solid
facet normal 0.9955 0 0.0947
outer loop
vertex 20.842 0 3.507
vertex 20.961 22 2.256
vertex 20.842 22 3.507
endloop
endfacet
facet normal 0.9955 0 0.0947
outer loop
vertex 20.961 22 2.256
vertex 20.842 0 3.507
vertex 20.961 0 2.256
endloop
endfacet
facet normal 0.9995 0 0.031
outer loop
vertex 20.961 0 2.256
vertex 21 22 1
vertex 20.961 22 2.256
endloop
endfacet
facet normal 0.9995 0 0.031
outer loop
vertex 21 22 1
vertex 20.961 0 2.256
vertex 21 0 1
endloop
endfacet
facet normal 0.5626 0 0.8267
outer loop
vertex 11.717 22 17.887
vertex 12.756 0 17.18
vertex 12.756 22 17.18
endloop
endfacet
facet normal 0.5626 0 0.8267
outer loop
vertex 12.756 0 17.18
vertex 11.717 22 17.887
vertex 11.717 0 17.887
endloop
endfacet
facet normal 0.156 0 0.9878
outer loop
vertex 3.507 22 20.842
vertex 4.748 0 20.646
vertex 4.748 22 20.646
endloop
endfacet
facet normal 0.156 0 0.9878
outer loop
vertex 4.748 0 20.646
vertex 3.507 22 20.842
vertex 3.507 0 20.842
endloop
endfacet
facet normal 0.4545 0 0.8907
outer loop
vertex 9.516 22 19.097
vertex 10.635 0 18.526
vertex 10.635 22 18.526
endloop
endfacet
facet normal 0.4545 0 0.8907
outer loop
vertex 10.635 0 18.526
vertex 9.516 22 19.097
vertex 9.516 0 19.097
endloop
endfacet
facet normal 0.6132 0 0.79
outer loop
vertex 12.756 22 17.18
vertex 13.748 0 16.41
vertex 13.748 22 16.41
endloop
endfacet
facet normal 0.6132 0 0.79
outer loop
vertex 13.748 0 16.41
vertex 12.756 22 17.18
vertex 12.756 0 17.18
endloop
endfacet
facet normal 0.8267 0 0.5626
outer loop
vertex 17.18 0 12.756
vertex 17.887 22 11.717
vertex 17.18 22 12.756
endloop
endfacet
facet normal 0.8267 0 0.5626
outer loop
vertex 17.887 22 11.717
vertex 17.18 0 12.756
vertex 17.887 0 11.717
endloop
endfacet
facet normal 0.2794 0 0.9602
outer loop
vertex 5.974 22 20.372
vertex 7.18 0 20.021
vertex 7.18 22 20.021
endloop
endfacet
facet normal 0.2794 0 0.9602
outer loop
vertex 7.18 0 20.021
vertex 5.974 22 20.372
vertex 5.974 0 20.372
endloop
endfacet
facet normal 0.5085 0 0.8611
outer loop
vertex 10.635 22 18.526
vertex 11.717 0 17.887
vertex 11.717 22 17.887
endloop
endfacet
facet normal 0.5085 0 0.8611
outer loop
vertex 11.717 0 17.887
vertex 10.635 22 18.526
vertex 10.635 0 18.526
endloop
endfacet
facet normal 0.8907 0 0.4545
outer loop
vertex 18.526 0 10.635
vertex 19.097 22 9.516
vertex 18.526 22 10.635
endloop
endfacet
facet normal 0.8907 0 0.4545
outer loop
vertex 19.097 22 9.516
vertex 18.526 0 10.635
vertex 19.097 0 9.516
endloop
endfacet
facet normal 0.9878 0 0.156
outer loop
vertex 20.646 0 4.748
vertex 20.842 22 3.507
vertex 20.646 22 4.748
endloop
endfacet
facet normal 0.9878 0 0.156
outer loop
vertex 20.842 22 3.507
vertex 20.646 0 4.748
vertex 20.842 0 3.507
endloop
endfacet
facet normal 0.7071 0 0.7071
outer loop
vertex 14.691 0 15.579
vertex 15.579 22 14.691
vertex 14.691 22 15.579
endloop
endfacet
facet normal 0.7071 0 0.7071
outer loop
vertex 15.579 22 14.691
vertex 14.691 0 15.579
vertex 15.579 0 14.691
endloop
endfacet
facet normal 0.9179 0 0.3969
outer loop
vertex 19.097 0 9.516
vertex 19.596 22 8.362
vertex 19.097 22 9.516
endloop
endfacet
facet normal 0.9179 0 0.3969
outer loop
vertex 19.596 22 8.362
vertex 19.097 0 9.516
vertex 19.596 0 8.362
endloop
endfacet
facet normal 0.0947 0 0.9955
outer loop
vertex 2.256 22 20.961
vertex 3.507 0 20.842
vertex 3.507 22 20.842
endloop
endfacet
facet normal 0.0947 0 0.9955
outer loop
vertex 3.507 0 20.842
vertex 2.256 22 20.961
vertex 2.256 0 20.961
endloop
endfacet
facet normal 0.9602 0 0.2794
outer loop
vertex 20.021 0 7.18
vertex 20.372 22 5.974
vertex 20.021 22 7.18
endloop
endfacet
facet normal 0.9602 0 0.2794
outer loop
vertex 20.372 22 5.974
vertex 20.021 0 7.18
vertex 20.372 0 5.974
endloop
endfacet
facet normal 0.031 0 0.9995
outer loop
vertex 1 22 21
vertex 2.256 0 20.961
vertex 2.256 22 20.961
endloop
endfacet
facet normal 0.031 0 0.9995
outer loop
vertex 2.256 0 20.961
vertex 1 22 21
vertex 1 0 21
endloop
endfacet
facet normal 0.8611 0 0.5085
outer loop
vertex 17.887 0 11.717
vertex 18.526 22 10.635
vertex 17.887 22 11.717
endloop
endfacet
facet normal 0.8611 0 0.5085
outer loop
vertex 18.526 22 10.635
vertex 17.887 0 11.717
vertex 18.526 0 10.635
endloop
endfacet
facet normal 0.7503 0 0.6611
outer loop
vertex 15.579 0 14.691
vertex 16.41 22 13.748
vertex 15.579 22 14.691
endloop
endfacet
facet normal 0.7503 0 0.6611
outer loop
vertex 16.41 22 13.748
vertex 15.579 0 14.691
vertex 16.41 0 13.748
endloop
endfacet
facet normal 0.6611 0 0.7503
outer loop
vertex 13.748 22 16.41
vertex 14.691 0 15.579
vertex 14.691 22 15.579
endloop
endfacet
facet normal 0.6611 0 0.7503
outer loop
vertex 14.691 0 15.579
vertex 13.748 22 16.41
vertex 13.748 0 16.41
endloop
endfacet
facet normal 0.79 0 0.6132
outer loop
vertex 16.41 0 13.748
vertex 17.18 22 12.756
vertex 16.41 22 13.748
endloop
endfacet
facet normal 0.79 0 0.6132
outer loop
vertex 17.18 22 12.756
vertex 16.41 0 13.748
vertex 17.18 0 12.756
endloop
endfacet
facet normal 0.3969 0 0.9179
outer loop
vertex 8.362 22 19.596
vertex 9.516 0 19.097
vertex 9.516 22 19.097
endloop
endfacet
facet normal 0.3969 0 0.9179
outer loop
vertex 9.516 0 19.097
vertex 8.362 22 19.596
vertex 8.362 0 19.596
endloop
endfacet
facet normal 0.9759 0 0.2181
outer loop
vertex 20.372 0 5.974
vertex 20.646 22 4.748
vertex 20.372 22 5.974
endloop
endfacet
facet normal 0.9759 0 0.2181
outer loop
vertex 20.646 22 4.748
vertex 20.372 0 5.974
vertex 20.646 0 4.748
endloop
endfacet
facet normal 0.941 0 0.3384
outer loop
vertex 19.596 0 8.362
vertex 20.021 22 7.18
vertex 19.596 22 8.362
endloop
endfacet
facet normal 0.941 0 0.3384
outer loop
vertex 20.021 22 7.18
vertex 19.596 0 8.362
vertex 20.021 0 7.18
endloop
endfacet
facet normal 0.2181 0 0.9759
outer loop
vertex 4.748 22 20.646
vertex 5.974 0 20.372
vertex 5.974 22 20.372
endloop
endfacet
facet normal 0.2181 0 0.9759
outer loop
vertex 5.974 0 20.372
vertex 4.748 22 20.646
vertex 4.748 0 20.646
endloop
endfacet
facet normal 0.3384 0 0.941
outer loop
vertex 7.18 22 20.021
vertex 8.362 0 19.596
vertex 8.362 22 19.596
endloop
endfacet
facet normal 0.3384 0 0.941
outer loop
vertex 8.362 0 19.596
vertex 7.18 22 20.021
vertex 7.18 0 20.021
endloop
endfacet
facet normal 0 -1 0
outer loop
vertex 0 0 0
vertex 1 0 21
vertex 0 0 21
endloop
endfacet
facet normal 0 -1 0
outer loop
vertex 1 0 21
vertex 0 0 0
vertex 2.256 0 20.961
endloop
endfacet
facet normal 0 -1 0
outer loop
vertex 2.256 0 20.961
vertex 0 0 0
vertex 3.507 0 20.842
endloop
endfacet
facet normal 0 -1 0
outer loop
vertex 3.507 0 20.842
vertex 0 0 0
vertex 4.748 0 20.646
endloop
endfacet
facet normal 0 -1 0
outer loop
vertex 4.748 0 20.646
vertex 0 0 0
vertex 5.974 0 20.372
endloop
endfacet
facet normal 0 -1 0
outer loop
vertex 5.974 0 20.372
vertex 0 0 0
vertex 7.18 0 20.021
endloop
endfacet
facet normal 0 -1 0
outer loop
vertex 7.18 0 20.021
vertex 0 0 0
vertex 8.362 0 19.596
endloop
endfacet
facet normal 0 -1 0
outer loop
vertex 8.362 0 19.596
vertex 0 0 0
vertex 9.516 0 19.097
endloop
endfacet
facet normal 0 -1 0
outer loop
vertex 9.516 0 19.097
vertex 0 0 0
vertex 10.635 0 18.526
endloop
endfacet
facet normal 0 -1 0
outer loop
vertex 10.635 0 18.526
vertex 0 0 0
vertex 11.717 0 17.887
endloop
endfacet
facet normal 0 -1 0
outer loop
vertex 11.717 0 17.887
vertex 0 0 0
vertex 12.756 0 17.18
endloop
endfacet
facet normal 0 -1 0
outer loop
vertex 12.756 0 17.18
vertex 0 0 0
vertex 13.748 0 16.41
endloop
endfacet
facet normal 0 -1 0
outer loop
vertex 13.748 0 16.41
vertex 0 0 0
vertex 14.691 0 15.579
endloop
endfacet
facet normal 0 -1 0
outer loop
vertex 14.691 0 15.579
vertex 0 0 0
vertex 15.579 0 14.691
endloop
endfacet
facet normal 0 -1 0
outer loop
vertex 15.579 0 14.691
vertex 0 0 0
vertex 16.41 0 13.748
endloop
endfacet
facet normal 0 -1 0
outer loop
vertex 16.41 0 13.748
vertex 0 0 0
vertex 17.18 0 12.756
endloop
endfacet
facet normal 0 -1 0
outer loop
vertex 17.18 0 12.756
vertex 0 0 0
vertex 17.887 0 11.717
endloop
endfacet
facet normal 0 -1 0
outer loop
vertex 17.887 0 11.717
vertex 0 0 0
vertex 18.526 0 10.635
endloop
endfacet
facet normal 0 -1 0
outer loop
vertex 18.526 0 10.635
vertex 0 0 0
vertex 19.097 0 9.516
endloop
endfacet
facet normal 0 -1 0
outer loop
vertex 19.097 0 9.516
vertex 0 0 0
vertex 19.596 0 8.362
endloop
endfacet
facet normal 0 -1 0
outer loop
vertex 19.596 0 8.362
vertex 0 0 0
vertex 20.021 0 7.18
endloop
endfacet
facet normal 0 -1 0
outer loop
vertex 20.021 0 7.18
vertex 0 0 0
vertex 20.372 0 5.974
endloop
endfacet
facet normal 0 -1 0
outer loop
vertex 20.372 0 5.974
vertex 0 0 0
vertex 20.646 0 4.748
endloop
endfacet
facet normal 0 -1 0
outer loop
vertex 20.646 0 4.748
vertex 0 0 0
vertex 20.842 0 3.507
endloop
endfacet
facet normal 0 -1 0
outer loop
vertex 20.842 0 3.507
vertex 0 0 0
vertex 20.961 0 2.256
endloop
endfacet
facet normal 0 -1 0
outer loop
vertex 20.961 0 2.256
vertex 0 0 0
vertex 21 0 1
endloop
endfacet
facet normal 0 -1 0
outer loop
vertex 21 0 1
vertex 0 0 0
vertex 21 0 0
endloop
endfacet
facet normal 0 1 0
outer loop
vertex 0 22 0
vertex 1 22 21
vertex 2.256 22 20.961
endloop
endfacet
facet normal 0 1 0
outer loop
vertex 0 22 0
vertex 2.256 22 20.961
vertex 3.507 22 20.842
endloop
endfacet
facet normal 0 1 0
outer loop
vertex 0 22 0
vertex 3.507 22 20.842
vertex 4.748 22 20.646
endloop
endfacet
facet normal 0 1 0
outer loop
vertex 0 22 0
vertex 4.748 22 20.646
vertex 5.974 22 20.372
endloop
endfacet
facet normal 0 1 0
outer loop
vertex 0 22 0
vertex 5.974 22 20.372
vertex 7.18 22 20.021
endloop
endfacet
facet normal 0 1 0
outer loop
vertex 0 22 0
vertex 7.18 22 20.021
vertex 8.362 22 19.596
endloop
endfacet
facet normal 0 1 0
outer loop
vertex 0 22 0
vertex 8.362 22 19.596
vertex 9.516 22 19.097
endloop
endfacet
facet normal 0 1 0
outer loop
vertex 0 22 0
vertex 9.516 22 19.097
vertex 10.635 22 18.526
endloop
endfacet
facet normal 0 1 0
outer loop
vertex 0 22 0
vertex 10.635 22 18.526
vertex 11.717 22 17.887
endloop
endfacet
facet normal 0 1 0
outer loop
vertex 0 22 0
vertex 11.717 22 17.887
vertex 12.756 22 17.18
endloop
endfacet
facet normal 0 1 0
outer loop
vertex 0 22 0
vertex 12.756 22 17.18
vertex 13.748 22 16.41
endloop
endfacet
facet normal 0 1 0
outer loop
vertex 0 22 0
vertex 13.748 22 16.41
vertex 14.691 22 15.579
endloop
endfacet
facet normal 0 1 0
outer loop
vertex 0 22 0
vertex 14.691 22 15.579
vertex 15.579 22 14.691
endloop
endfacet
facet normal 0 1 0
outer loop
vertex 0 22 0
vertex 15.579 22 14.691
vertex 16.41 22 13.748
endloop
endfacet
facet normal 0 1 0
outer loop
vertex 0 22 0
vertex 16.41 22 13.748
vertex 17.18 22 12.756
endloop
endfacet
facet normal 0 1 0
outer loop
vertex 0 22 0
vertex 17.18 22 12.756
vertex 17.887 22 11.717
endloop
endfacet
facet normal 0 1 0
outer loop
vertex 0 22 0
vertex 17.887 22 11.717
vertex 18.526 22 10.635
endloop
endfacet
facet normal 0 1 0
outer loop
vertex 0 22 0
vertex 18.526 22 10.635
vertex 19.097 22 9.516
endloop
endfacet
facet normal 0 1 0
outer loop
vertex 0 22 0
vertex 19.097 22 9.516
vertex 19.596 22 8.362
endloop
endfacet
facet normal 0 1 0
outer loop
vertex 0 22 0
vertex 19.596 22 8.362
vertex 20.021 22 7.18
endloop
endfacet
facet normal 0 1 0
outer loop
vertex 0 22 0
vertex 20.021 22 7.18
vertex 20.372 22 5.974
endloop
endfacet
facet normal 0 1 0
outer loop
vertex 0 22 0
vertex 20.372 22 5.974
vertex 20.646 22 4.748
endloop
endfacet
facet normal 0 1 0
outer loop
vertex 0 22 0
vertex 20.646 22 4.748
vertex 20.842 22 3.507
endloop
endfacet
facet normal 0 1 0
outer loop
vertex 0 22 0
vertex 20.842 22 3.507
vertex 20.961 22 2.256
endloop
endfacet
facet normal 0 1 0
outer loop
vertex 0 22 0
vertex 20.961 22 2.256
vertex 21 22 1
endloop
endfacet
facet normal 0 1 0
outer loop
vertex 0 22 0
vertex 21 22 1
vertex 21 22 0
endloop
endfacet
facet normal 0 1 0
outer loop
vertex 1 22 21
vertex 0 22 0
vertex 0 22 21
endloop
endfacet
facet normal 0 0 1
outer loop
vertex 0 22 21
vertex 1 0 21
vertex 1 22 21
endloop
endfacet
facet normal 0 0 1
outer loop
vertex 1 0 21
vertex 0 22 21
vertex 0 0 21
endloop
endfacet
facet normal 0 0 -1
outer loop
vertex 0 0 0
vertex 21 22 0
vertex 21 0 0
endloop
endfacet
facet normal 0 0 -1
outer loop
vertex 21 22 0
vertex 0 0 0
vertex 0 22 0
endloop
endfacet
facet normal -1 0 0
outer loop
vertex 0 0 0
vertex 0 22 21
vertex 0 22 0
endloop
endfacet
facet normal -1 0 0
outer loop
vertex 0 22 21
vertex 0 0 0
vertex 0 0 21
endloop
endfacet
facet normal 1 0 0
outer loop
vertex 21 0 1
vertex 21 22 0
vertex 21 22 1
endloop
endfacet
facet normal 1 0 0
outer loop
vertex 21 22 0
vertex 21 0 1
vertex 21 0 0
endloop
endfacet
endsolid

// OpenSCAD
sub_model = "All"; // [All,Base,Infill]

$fn = 100;

if(sub_model=="All" || sub_model=="Infill")
{
	color("yellow") translate([1,1,1]) intersection()
	{
		cube(50);
		translate([0,20,0]) rotate([90,0,0]) cylinder(20, 20, 20);
	}
}

if(sub_model=="All" || sub_model=="Base")
{
    color("blue") cube([1,22,21]);
	color("red") translate([1,0,0]) cube([20,22,1]);
    
    color("green") intersection()
    {
        translate([1,22,1]) rotate([90,0,0]) cylinder(22, 20, 20);
        
        union()
        {
            translate([1,0,1]) cube([20,1,20]);
            translate([1,21,1]) cube([20,1,20]);
        }
    }
}
